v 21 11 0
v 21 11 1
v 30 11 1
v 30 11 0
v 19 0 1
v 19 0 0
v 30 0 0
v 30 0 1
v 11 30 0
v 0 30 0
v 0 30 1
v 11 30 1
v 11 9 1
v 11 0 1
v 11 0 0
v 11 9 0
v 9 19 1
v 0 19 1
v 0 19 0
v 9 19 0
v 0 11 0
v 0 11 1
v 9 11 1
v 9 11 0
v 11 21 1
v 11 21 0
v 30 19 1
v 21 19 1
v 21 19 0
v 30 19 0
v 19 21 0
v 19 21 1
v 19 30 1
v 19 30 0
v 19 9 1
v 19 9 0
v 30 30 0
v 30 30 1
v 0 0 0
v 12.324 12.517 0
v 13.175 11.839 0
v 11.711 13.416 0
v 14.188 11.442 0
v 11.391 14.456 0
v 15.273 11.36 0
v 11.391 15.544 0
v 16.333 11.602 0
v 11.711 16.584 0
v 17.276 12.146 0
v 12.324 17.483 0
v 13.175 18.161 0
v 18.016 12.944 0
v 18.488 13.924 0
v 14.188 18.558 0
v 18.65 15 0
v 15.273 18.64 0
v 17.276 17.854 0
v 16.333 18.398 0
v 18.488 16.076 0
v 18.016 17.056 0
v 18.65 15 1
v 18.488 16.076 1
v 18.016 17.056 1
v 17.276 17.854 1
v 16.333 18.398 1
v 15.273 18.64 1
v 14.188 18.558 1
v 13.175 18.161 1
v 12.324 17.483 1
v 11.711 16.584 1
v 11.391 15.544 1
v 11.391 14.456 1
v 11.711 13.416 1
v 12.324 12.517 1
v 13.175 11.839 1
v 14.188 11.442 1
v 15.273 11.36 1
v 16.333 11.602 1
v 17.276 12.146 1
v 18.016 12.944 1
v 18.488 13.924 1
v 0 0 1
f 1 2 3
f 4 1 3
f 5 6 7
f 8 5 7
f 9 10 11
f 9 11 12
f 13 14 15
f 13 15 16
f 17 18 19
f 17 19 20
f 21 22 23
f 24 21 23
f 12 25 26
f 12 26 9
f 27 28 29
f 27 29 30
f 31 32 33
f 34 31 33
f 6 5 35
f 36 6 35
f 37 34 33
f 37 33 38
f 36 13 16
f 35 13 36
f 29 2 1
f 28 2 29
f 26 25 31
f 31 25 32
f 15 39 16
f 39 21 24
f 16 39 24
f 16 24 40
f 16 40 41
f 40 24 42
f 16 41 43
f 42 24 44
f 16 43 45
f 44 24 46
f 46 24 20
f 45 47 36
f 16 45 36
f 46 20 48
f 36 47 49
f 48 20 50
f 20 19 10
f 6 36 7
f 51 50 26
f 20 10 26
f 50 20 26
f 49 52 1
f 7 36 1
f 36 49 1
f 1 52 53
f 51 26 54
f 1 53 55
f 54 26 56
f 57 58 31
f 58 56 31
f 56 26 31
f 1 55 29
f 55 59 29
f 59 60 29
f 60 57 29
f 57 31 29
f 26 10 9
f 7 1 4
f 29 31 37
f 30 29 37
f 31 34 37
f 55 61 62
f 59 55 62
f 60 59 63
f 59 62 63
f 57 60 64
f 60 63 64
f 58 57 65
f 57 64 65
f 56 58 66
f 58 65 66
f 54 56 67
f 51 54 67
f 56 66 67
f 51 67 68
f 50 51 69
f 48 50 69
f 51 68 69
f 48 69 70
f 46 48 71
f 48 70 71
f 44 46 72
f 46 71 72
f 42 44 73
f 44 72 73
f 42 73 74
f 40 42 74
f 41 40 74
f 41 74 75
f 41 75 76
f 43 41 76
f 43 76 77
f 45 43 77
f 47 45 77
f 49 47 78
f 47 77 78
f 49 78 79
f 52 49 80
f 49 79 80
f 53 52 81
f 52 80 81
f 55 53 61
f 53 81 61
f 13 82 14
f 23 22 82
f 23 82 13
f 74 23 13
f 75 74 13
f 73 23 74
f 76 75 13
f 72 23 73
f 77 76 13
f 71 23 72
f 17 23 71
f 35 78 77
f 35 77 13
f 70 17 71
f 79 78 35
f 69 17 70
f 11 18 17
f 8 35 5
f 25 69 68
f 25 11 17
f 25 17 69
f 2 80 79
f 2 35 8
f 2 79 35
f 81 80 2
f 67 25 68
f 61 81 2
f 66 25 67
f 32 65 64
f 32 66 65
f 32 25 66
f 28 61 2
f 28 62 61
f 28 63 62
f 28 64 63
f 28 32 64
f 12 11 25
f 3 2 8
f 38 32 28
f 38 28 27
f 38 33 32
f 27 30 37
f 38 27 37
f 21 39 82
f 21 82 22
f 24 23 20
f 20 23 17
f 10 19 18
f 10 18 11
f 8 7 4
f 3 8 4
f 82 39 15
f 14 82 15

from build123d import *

# Parameters (mm, degrees)
SKETCH003_W   = 30
SKETCH003_H   = 30
PAD002_DEPTH  = 1
SKETCH002_R   = 3.65
SKETCH002_W   = 8
SKETCH002_H   = 9
SKETCH002_W_2 = 9
SKETCH002_H_2 = 8
POCKET_DEPTH  = 1


with BuildPart() as part:
    # Sketch003 → Pad002 (new body)
    with BuildSketch(Plane.XY):
        with Locations((15, 15)):
            Rectangle(SKETCH003_W, SKETCH003_H)
    extrude(amount=PAD002_DEPTH)

    # Sketch002 → Pocket (cut)
    with BuildSketch(Plane.XY.offset(1)):
        with Locations((15, 15)):
            Circle(SKETCH002_R)
        with Locations((15, 25.5)):
            Rectangle(SKETCH002_W, SKETCH002_H)
        with Locations((15, 4.5)):
            Rectangle(SKETCH002_W, SKETCH002_H)
        with Locations((4.5, 15)):
            Rectangle(SKETCH002_W_2, SKETCH002_H_2)
        with Locations((25.5, 15)):
            Rectangle(SKETCH002_W_2, SKETCH002_H_2)
    extrude(amount=-POCKET_DEPTH, mode=Mode.SUBTRACT)


solid = part.part
